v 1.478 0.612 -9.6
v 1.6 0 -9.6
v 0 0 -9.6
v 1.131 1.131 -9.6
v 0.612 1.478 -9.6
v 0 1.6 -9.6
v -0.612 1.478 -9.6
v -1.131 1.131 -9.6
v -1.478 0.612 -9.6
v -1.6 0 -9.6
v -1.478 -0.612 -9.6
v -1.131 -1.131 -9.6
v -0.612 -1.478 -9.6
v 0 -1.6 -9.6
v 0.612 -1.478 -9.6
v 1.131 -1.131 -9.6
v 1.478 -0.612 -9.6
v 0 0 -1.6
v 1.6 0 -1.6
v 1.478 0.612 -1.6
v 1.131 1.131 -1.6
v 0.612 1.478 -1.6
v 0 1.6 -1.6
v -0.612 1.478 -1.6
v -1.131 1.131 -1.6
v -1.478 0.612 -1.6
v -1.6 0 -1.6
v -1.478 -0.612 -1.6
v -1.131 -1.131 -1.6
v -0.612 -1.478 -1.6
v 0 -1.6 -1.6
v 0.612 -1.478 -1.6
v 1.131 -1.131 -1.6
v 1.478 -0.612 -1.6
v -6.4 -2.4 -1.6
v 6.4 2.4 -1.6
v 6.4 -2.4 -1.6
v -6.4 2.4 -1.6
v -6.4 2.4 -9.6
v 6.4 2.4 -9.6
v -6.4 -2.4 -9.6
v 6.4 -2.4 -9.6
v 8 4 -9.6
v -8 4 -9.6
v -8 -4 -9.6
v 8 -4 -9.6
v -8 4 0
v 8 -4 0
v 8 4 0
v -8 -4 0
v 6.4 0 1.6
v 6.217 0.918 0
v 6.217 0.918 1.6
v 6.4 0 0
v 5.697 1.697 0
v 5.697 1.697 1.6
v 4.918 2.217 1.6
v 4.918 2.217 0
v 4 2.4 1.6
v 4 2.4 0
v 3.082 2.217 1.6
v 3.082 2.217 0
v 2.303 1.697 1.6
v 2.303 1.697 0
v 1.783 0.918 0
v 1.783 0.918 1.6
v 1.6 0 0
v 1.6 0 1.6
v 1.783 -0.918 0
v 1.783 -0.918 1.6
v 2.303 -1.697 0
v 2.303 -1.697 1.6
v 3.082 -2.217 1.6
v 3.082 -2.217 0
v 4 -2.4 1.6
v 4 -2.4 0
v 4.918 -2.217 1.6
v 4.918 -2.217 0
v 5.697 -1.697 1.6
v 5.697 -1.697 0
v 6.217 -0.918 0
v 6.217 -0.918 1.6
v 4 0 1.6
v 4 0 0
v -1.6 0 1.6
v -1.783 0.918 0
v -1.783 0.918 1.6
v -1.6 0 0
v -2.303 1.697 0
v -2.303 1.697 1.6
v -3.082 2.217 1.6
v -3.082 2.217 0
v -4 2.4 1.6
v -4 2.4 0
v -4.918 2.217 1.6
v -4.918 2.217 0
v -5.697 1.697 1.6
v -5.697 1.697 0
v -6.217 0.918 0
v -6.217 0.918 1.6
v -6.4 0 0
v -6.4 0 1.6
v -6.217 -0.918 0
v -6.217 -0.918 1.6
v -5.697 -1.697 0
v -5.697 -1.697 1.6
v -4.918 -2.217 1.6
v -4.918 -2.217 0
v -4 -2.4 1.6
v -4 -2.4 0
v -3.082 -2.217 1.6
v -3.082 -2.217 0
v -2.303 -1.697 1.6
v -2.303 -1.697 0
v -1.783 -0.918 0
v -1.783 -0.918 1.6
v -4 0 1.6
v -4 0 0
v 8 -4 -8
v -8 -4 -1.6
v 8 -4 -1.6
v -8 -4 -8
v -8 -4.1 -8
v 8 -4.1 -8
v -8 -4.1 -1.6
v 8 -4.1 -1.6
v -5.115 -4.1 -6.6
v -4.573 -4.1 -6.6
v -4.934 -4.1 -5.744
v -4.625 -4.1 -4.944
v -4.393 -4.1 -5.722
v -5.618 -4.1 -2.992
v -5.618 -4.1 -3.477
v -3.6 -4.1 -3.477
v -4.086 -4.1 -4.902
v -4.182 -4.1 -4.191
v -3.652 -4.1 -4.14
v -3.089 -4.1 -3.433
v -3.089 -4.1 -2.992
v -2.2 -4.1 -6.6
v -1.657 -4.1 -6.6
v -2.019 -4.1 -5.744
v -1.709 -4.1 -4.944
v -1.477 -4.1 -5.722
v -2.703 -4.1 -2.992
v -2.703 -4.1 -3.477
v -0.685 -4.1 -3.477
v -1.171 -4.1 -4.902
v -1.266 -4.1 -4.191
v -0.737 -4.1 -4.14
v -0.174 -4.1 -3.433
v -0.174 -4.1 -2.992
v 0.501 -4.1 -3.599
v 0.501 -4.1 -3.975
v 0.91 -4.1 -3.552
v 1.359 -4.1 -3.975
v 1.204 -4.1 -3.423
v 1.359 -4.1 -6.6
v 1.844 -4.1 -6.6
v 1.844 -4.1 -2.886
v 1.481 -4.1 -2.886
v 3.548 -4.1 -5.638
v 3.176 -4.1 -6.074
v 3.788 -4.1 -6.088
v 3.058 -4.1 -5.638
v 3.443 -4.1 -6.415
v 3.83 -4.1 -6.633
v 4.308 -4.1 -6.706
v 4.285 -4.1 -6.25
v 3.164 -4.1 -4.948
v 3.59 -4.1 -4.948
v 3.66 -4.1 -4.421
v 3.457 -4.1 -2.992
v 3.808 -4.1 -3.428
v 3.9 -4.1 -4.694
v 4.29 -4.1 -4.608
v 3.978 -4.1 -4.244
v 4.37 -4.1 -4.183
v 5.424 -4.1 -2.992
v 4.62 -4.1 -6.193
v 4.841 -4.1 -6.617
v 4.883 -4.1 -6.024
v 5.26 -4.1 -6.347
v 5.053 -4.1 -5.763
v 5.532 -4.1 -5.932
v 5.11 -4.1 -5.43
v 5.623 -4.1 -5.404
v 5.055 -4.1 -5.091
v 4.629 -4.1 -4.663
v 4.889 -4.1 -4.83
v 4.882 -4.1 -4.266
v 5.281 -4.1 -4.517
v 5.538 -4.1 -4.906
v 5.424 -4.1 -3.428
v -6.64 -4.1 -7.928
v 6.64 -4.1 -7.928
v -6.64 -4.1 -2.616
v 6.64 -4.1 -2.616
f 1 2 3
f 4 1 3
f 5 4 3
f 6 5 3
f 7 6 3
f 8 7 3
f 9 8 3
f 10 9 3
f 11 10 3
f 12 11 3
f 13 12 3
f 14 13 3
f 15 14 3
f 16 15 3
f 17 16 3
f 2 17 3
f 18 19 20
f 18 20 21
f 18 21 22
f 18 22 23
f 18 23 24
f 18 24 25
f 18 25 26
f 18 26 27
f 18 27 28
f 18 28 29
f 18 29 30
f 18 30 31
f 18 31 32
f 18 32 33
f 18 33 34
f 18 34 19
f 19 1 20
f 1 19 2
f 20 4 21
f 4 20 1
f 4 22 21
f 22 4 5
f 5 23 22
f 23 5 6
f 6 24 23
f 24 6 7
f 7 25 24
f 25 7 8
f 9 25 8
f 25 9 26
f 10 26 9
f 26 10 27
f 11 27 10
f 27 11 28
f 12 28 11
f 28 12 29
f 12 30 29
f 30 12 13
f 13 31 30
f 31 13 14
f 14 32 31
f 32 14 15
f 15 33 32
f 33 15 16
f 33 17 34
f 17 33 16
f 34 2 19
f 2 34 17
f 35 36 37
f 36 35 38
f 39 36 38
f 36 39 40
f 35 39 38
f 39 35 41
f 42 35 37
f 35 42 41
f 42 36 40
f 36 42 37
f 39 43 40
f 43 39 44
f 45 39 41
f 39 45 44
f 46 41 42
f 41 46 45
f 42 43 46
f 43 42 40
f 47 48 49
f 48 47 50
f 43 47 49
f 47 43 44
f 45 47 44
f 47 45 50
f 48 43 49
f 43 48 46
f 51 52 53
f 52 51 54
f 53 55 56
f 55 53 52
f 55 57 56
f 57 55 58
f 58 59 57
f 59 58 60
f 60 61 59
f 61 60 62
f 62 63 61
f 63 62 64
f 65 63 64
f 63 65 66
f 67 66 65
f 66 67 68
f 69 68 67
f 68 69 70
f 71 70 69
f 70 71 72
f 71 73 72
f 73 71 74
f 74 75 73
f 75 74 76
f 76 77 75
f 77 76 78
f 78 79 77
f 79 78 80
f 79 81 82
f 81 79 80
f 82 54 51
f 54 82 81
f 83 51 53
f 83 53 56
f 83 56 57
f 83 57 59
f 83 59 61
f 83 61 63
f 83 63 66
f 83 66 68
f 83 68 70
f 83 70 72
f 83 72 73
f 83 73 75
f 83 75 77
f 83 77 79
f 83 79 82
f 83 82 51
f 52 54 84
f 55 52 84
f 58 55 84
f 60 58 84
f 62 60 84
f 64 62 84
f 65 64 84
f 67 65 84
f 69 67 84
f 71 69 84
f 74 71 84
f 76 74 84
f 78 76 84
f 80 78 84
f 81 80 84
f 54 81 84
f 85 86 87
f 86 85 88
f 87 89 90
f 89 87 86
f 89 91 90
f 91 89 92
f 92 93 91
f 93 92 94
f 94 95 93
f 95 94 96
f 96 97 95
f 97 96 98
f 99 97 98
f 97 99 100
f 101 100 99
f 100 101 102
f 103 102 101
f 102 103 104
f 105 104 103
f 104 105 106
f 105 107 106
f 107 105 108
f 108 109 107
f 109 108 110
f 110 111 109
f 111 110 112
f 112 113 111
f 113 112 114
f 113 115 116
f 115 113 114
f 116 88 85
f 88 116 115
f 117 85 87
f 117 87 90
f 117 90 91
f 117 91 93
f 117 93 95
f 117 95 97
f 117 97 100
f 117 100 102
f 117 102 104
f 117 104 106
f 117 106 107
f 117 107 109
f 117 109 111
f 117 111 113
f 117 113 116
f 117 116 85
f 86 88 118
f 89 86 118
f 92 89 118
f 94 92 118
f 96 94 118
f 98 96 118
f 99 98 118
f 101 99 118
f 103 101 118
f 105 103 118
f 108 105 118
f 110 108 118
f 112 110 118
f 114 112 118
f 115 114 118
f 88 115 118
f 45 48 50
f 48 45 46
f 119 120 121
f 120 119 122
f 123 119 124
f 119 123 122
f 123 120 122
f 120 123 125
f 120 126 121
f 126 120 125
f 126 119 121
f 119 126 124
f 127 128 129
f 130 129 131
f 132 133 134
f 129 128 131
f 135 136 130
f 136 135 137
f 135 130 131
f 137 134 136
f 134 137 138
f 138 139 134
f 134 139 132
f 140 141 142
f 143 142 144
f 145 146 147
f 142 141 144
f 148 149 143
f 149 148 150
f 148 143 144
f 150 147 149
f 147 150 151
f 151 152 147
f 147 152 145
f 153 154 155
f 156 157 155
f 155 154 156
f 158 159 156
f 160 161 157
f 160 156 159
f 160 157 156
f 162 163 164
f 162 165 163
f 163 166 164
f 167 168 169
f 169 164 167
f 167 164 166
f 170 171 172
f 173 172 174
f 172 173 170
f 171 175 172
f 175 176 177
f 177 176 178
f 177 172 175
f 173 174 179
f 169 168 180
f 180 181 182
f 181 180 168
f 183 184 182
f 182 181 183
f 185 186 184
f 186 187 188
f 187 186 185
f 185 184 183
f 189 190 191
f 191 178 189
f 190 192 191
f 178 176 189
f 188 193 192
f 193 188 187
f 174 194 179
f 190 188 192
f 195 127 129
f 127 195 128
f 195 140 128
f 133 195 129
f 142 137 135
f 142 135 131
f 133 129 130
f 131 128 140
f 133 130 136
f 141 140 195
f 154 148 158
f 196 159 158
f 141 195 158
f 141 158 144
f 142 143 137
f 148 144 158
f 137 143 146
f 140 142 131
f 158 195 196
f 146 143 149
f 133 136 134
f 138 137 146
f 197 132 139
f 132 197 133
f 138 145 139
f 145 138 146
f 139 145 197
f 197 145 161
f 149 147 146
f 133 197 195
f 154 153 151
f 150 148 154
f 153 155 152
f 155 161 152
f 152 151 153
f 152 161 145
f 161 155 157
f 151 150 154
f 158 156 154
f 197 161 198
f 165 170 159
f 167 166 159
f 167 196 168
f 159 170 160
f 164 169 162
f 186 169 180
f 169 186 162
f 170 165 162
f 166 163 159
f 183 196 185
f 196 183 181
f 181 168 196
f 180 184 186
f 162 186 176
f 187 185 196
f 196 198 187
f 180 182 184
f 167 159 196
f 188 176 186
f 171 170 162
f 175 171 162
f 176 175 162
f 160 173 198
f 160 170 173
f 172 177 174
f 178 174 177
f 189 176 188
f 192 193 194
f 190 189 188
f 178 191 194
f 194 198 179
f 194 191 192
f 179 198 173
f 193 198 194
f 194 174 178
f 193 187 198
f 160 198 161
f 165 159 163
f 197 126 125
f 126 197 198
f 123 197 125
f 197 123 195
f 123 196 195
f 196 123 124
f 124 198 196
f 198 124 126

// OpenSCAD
// file: ../p/4-4edge.scad
use <../lib.scad>
function ldraw_lib__4_4edge() = [
// 0 Circle 1.0
// 0 Name: 4-4edge.dat
// 0 Author: James Jessiman
// 0 !LDRAW_ORG Primitive UPDATE 2017-01
// 0 !LICENSE Licensed under CC BY 2.0 and CC BY 4.0 : see CAreadme.txt
// 
// 0 BFC CERTIFY CCW
  [0,"BFC","CERTIFY"],
  [0,"BFC","CCW"],
// 
// 0 !HISTORY 1998-12-15 [PTadmin] Official Update 1998-10
// 0 !HISTORY 2005-12-28 [PTadmin] Official Update 2005-01
// 0 !HISTORY 2007-06-24 [PTadmin] Header formatted for Contributor Agreement
// 0 !HISTORY 2008-07-01 [PTadmin] Official Update 2008-01
// 0 !HISTORY 2017-01-15 [Steffen] BFCed
// 0 !HISTORY 2017-12-30 [PTadmin] Official Update 2017-01
// 
// 
// 2 24 1 0 0 0.9239 0 0.3827
  [2,24,1,0,0,0.9239,0,0.3827],
// 2 24 0.9239 0 0.3827 0.7071 0 0.7071
  [2,24,0.9239,0,0.3827,0.7071,0,0.7071],
// 2 24 0.7071 0 0.7071 0.3827 0 0.9239
  [2,24,0.7071,0,0.7071,0.3827,0,0.9239],
// 2 24 0.3827 0 0.9239 0 0 1
  [2,24,0.3827,0,0.9239,0,0,1],
// 2 24 0 0 1 -0.3827 0 0.9239
  [2,24,0,0,1,-0.3827,0,0.9239],
// 2 24 -0.3827 0 0.9239 -0.7071 0 0.7071
  [2,24,-0.3827,0,0.9239,-0.7071,0,0.7071],
// 2 24 -0.7071 0 0.7071 -0.9239 0 0.3827
  [2,24,-0.7071,0,0.7071,-0.9239,0,0.3827],
// 2 24 -0.9239 0 0.3827 -1 0 -0
  [2,24,-0.9239,0,0.3827,-1,0,-0],
// 2 24 -1 0 -0 -0.9239 0 -0.3827
  [2,24,-1,0,-0,-0.9239,0,-0.3827],
// 2 24 -0.9239 0 -0.3827 -0.7071 0 -0.7071
  [2,24,-0.9239,0,-0.3827,-0.7071,0,-0.7071],
// 2 24 -0.7071 0 -0.7071 -0.3827 0 -0.9239
  [2,24,-0.7071,0,-0.7071,-0.3827,0,-0.9239],
// 2 24 -0.3827 0 -0.9239 0 0 -1
  [2,24,-0.3827,0,-0.9239,0,0,-1],
// 2 24 0 0 -1 0.3827 0 -0.9239
  [2,24,0,0,-1,0.3827,0,-0.9239],
// 2 24 0.3827 0 -0.9239 0.7071 0 -0.7071
  [2,24,0.3827,0,-0.9239,0.7071,0,-0.7071],
// 2 24 0.7071 0 -0.7071 0.9239 0 -0.3827
  [2,24,0.7071,0,-0.7071,0.9239,0,-0.3827],
// 2 24 0.9239 0 -0.3827 1 0 0
  [2,24,0.9239,0,-0.3827,1,0,0],
];
module ldraw_lib__4_4edge(step=0, col=false, unit=2/5, alt=false, line=0.2, solid=!$preview)
    makepoly(ldraw_lib__4_4edge(), step=step, col=col, unit=unit, alt=alt, line=line, solid=solid);
ldraw_lib__4_4edge(line=0.2);
// file: ../p/4-4disc.scad
use <../lib.scad>
function ldraw_lib__4_4disc() = [
// 0 Disc 1.0
// 0 Name: 4-4disc.dat
// 0 Author: James Jessiman
// 0 !LDRAW_ORG Primitive UPDATE 2002-02
// 0 !LICENSE Licensed under CC BY 2.0 and CC BY 4.0 : see CAreadme.txt
// 
// 0 BFC CERTIFY CCW
  [0,"BFC","CERTIFY"],
  [0,"BFC","CCW"],
// 
// 0 !HISTORY 1998-12-15 [PTadmin] Official Update 1998-10
// 0 !HISTORY 2002-03-23 [sbliss] Added BFC statement
// 0 !HISTORY 2002-04-25 [PTadmin] Official Update 2002-02
// 0 !HISTORY 2007-06-24 [PTadmin] Header formatted for Contributor Agreement
// 0 !HISTORY 2008-07-01 [PTadmin] Official Update 2008-01
// 
// 
// 3 16 0 0 0 1 0 0 0.9239 0 0.3827
  [3,16,0,0,0,1,0,0,0.9239,0,0.3827],
// 3 16 0 0 0 0.9239 0 0.3827 0.7071 0 0.7071
  [3,16,0,0,0,0.9239,0,0.3827,0.7071,0,0.7071],
// 3 16 0 0 0 0.7071 0 0.7071 0.3827 0 0.9239
  [3,16,0,0,0,0.7071,0,0.7071,0.3827,0,0.9239],
// 3 16 0 0 0 0.3827 0 0.9239 0 0 1
  [3,16,0,0,0,0.3827,0,0.9239,0,0,1],
// 3 16 0 0 0 0 0 1 -0.3827 0 0.9239
  [3,16,0,0,0,0,0,1,-0.3827,0,0.9239],
// 3 16 0 0 0 -0.3827 0 0.9239 -0.7071 0 0.7071
  [3,16,0,0,0,-0.3827,0,0.9239,-0.7071,0,0.7071],
// 3 16 0 0 0 -0.7071 0 0.7071 -0.9239 0 0.3827
  [3,16,0,0,0,-0.7071,0,0.7071,-0.9239,0,0.3827],
// 3 16 0 0 0 -0.9239 0 0.3827 -1 0 -0
  [3,16,0,0,0,-0.9239,0,0.3827,-1,0,-0],
// 3 16 0 0 0 -1 0 -0 -0.9239 0 -0.3827
  [3,16,0,0,0,-1,0,-0,-0.9239,0,-0.3827],
// 3 16 0 0 0 -0.9239 0 -0.3827 -0.7071 0 -0.7071
  [3,16,0,0,0,-0.9239,0,-0.3827,-0.7071,0,-0.7071],
// 3 16 0 0 0 -0.7071 0 -0.7071 -0.3827 0 -0.9239
  [3,16,0,0,0,-0.7071,0,-0.7071,-0.3827,0,-0.9239],
// 3 16 0 0 0 -0.3827 0 -0.9239 0 0 -1
  [3,16,0,0,0,-0.3827,0,-0.9239,0,0,-1],
// 3 16 0 0 0 0 0 -1 0.3827 0 -0.9239
  [3,16,0,0,0,0,0,-1,0.3827,0,-0.9239],
// 3 16 0 0 0 0.3827 0 -0.9239 0.7071 0 -0.7071
  [3,16,0,0,0,0.3827,0,-0.9239,0.7071,0,-0.7071],
// 3 16 0 0 0 0.7071 0 -0.7071 0.9239 0 -0.3827
  [3,16,0,0,0,0.7071,0,-0.7071,0.9239,0,-0.3827],
// 3 16 0 0 0 0.9239 0 -0.3827 1 0 0
  [3,16,0,0,0,0.9239,0,-0.3827,1,0,0],
// 0
];
module ldraw_lib__4_4disc(step=0, col=false, unit=2/5, alt=false, line=0.2, solid=!$preview)
    makepoly(ldraw_lib__4_4disc(), step=step, col=col, unit=unit, alt=alt, line=line, solid=solid);
ldraw_lib__4_4disc(line=0.2);
// file: ../p/4-4cyli.scad
use <../lib.scad>
$fa=1; $fs=0.2;
function ldraw_lib__4_4cyli(realsolid=false) = [
// 0 Cylinder 1.0
// 0 Name: 4-4cyli.dat
// 0 Author: James Jessiman
// 0 !LDRAW_ORG Primitive UPDATE 2005-01
// 0 !LICENSE Licensed under CC BY 2.0 and CC BY 4.0 : see CAreadme.txt
// 
// 0 BFC CERTIFY CCW
  [0,"BFC","CERTIFY"],
  [0,"BFC","CCW"],
// 
// 0 !HISTORY 1998-12-15 [PTadmin] Official Update 1998-10
// 0 !HISTORY 2002-03-23 [sbliss] Added BFC statement; merged headers from files in distributions LDraw 0.27 and Complete.
// 0 !HISTORY 2002-04-25 [PTadmin] Official Update 2002-02
// 0 !HISTORY 2004-12-14 [guyvivan] BFC CCW
// 0 !HISTORY 2005-12-28 [PTadmin] Official Update 2005-01
// 0 !HISTORY 2007-06-24 [PTadmin] Header formatted for Contributor Agreement
// 0 !HISTORY 2008-07-01 [PTadmin] Official Update 2008-01
// 
// 
// 4 16 1 1 0 0.9239 1 0.3827 0.9239 0 0.3827 1 0 0
  [4,16,1,1,0,0.9239,1,0.3827,0.9239,0,0.3827,1,0,0],
// 5 24 1 0 0 1 1 0 0.9239 0 0.3827 0.9239 0 -0.3827
  [5,24,1,0,0,1,1,0,0.9239,0,0.3827,0.9239,0,-0.3827],
// 4 16 0.9239 1 0.3827 0.7071 1 0.7071 0.7071 0 0.7071 0.9239 0 0.3827
  [4,16,0.9239,1,0.3827,0.7071,1,0.7071,0.7071,0,0.7071,0.9239,0,0.3827],
// 5 24 0.9239 0 0.3827 0.9239 1 0.3827 0.7071 0 0.7071 1 0 0
  [5,24,0.9239,0,0.3827,0.9239,1,0.3827,0.7071,0,0.7071,1,0,0],
// 4 16 0.7071 1 0.7071 0.3827 1 0.9239 0.3827 0 0.9239 0.7071 0 0.7071
  [4,16,0.7071,1,0.7071,0.3827,1,0.9239,0.3827,0,0.9239,0.7071,0,0.7071],
// 5 24 0.7071 0 0.7071 0.7071 1 0.7071 0.3827 0 0.9239 0.9239 0 0.3827
  [5,24,0.7071,0,0.7071,0.7071,1,0.7071,0.3827,0,0.9239,0.9239,0,0.3827],
// 4 16 0.3827 1 0.9239 0 1 1 0 0 1 0.3827 0 0.9239
  [4,16,0.3827,1,0.9239,0,1,1,0,0,1,0.3827,0,0.9239],
// 5 24 0.3827 0 0.9239 0.3827 1 0.9239 0 0 1 0.7071 0 0.7071
  [5,24,0.3827,0,0.9239,0.3827,1,0.9239,0,0,1,0.7071,0,0.7071],
// 4 16 0 1 1 -0.3827 1 0.9239 -0.3827 0 0.9239 0 0 1
  [4,16,0,1,1,-0.3827,1,0.9239,-0.3827,0,0.9239,0,0,1],
// 5 24 0 0 1 0 1 1 -0.3827 0 0.9239 0.3827 0 0.9239
  [5,24,0,0,1,0,1,1,-0.3827,0,0.9239,0.3827,0,0.9239],
// 4 16 -0.3827 1 0.9239 -0.7071 1 0.7071 -0.7071 0 0.7071 -0.3827 0 0.9239
  [4,16,-0.3827,1,0.9239,-0.7071,1,0.7071,-0.7071,0,0.7071,-0.3827,0,0.9239],
// 5 24 -0.3827 0 0.9239 -0.3827 1 0.9239 -0.7071 0 0.7071 0 0 1
  [5,24,-0.3827,0,0.9239,-0.3827,1,0.9239,-0.7071,0,0.7071,0,0,1],
// 4 16 -0.7071 1 0.7071 -0.9239 1 0.3827 -0.9239 0 0.3827 -0.7071 0 0.7071
  [4,16,-0.7071,1,0.7071,-0.9239,1,0.3827,-0.9239,0,0.3827,-0.7071,0,0.7071],
// 5 24 -0.7071 0 0.7071 -0.7071 1 0.7071 -0.9239 0 0.3827 -0.3827 0 0.9239
  [5,24,-0.7071,0,0.7071,-0.7071,1,0.7071,-0.9239,0,0.3827,-0.3827,0,0.9239],
// 4 16 -0.9239 1 0.3827 -1 1 0 -1 0 0 -0.9239 0 0.3827
  [4,16,-0.9239,1,0.3827,-1,1,0,-1,0,0,-0.9239,0,0.3827],
// 5 24 -0.9239 0 0.3827 -0.9239 1 0.3827 -1 0 0 -0.7071 0 0.7071
  [5,24,-0.9239,0,0.3827,-0.9239,1,0.3827,-1,0,0,-0.7071,0,0.7071],
// 4 16 -1 1 0 -0.9239 1 -0.3827 -0.9239 0 -0.3827 -1 0 0
  [4,16,-1,1,0,-0.9239,1,-0.3827,-0.9239,0,-0.3827,-1,0,0],
// 5 24 -1 0 0 -1 1 0 -0.9239 0 -0.3827 -0.9239 0 0.3827
  [5,24,-1,0,0,-1,1,0,-0.9239,0,-0.3827,-0.9239,0,0.3827],
// 4 16 -0.9239 1 -0.3827 -0.7071 1 -0.7071 -0.7071 0 -0.7071 -0.9239 0 -0.3827
  [4,16,-0.9239,1,-0.3827,-0.7071,1,-0.7071,-0.7071,0,-0.7071,-0.9239,0,-0.3827],
// 5 24 -0.9239 0 -0.3827 -0.9239 1 -0.3827 -0.7071 0 -0.7071 -1 0 0
  [5,24,-0.9239,0,-0.3827,-0.9239,1,-0.3827,-0.7071,0,-0.7071,-1,0,0],
// 4 16 -0.7071 1 -0.7071 -0.3827 1 -0.9239 -0.3827 0 -0.9239 -0.7071 0 -0.7071
  [4,16,-0.7071,1,-0.7071,-0.3827,1,-0.9239,-0.3827,0,-0.9239,-0.7071,0,-0.7071],
// 5 24 -0.7071 0 -0.7071 -0.7071 1 -0.7071 -0.3827 0 -0.9239 -0.9239 0 -0.3827
  [5,24,-0.7071,0,-0.7071,-0.7071,1,-0.7071,-0.3827,0,-0.9239,-0.9239,0,-0.3827],
// 4 16 -0.3827 1 -0.9239 0 1 -1 0 0 -1 -0.3827 0 -0.9239
  [4,16,-0.3827,1,-0.9239,0,1,-1,0,0,-1,-0.3827,0,-0.9239],
// 5 24 -0.3827 0 -0.9239 -0.3827 1 -0.9239 0 0 -1 -0.7071 0 -0.7071
  [5,24,-0.3827,0,-0.9239,-0.3827,1,-0.9239,0,0,-1,-0.7071,0,-0.7071],
// 4 16 0 1 -1 0.3827 1 -0.9239 0.3827 0 -0.9239 0 0 -1
  [4,16,0,1,-1,0.3827,1,-0.9239,0.3827,0,-0.9239,0,0,-1],
// 5 24 0 0 -1 0 1 -1 0.3827 0 -0.9239 -0.3827 0 -0.9239
  [5,24,0,0,-1,0,1,-1,0.3827,0,-0.9239,-0.3827,0,-0.9239],
// 4 16 0.3827 1 -0.9239 0.7071 1 -0.7071 0.7071 0 -0.7071 0.3827 0 -0.9239
  [4,16,0.3827,1,-0.9239,0.7071,1,-0.7071,0.7071,0,-0.7071,0.3827,0,-0.9239],
// 5 24 0.3827 0 -0.9239 0.3827 1 -0.9239 0.7071 0 -0.7071 0 0 -1
  [5,24,0.3827,0,-0.9239,0.3827,1,-0.9239,0.7071,0,-0.7071,0,0,-1],
// 4 16 0.7071 1 -0.7071 0.9239 1 -0.3827 0.9239 0 -0.3827 0.7071 0 -0.7071
  [4,16,0.7071,1,-0.7071,0.9239,1,-0.3827,0.9239,0,-0.3827,0.7071,0,-0.7071],
// 5 24 0.7071 0 -0.7071 0.7071 1 -0.7071 0.9239 0 -0.3827 0.3827 0 -0.9239
  [5,24,0.7071,0,-0.7071,0.7071,1,-0.7071,0.9239,0,-0.3827,0.3827,0,-0.9239],
// 4 16 0.9239 1 -0.3827 1 1 0 1 0 0 0.9239 0 -0.3827
  [4,16,0.9239,1,-0.3827,1,1,0,1,0,0,0.9239,0,-0.3827],
// 5 24 0.9239 0 -0.3827 0.9239 1 -0.3827 1 0 0 0.7071 0 -0.7071
  [5,24,0.9239,0,-0.3827,0.9239,1,-0.3827,1,0,0,0.7071,0,-0.7071],
// 0
];
module ldraw_lib__4_4cyli(step=0, col=false, unit=2/5, alt=false, line=0.2, solid=!$preview)
    makepoly(ldraw_lib__4_4cyli(solid), step=step, col=col, unit=unit, alt=alt, line=line, solid=solid);
ldraw_lib__4_4cyli(line=0.2);
// file: ../p/stud3.scad
use <../lib.scad>
use <4-4cyli.scad>
use <4-4disc.scad>
use <4-4edge.scad>
function ldraw_lib__stud3() = [
// 0 Stud Tube Solid
// 0 Name: stud3.dat
// 0 Author: James Jessiman
// 0 !LDRAW_ORG Primitive UPDATE 2012-01
// 0 !LICENSE Licensed under CC BY 4.0 : see CAreadme.txt
// 
// 0 BFC CERTIFY CCW
  [0,"BFC","CERTIFY"],
  [0,"BFC","CCW"],
// 
// 0 !HISTORY 2002-04-04 [sbliss] Modified for BFC compliance
// 0 !HISTORY 2002-04-25 [PTadmin] Official Update 2002-02
// 0 !HISTORY 2007-06-24 [PTadmin] Header formatted for Contributor Agreement
// 0 !HISTORY 2008-07-01 [PTadmin] Official Update 2008-01
// 0 !HISTORY 2012-02-16 [Philo] Changed to CCW
// 0 !HISTORY 2012-03-30 [PTadmin] Official Update 2012-01
// 
// 
// 1 16 0 -4 0 4 0 0 0 1 0 0 0 4 4-4edge.dat
  [1,16,0,-4,0,4,0,0,0,1,0,0,0,4, ldraw_lib__4_4edge()],
// 1 16 0 0 0 4 0 0 0 1 0 0 0 4 4-4edge.dat
  [1,16,0,0,0,4,0,0,0,1,0,0,0,4, ldraw_lib__4_4edge()],
// 1 16 0 -4 0 4 0 0 0 1 0 0 0 4 4-4disc.dat
  [1,16,0,-4,0,4,0,0,0,1,0,0,0,4, ldraw_lib__4_4disc()],
  [-1,16,0,0,0,4,0,0,0,-1,0,0,0,4, ldraw_lib__4_4disc()],
// 1 16 0 -4 0 4 0 0 0 4 0 0 0 4 4-4cyli.dat
  [1,16,0,-4,0,4,0,0,0,4,0,0,0,4, ldraw_lib__4_4cyli()],
];
module ldraw_lib__stud3(step=0, col=false, unit=2/5, alt=false, line=0.2, solid=!$preview)
    makepoly(ldraw_lib__stud3(), step=step, col=col, unit=unit, alt=alt, line=line, solid=solid);
ldraw_lib__stud3(line=0.2);
// file: ../p/stud.scad
use <../lib.scad>
use <4-4cyli.scad>
use <4-4disc.scad>
use <4-4edge.scad>
function ldraw_lib__stud() = [
// 0 Stud
// 0 Name: stud.dat
// 0 Author: James Jessiman
// 0 !LDRAW_ORG Primitive UPDATE 2012-01
// 0 !LICENSE Licensed under CC BY 4.0 : see CAreadme.txt
// 
// 0 BFC CERTIFY CCW
  [0,"BFC","CERTIFY"],
  [0,"BFC","CCW"],
// 
// 0 !HISTORY 2002-04-04 [sbliss] Modified for BFC compliance
// 0 !HISTORY 2002-04-25 [PTadmin] Official Update 2002-02
// 0 !HISTORY 2007-06-24 [PTadmin] Header formatted for Contributor Agreement
// 0 !HISTORY 2008-07-01 [PTadmin] Official Update 2008-01
// 0 !HISTORY 2012-02-16 [Philo] Changed to CCW
// 0 !HISTORY 2012-03-30 [PTadmin] Official Update 2012-01
// 
// 
// 1 16 0 0 0 6 0 0 0 1 0 0 0 6 4-4edge.dat
  [1,16,0,0,0,6,0,0,0,1,0,0,0,6, ldraw_lib__4_4edge()],
// 1 16 0 -4 0 6 0 0 0 1 0 0 0 6 4-4edge.dat
  [1,16,0,-4,0,6,0,0,0,1,0,0,0,6, ldraw_lib__4_4edge()],
// 1 16 0 0 0 6 0 0 0 -4 0 0 0 6 4-4cyli.dat
  [1,16,0,0,0,6,0,0,0,-4,0,0,0,6, ldraw_lib__4_4cyli()],
// 1 16 0 -4 0 6 0 0 0 1 0 0 0 6 4-4disc.dat
  [1,16,0,-4,0,6,0,0,0,1,0,0,0,6, ldraw_lib__4_4disc()],
  [-1,16,0,0,0,6,0,0,0,-1,0,0,0,6, ldraw_lib__4_4disc()],
];
module ldraw_lib__stud(step=0, col=false, unit=2/5, alt=false, line=0.2, solid=!$preview)
    makepoly(ldraw_lib__stud(), step=step, col=col, unit=unit, alt=alt, line=line, solid=solid);
ldraw_lib__stud(line=0.2);
// file: ../p/box5.scad
use <../lib.scad>
function ldraw_lib__box5() = [
// 0 Box with 5 Faces and All Edges
// 0 Name: box5.dat
// 0 Author: James Jessiman
// 0 !LDRAW_ORG Primitive UPDATE 2012-01
// 0 !LICENSE Licensed under CC BY 2.0 and CC BY 4.0 : see CAreadme.txt
// 
// 0 BFC CERTIFY CCW
  [0,"BFC","CERTIFY"],
  [0,"BFC","CCW"],
// 
// 0 !HISTORY 2002-04-03 [sbliss] Modified for BFC compliance
// 0 !HISTORY 2002-04-25 [PTadmin] Official Update 2002-02
// 0 !HISTORY 2007-06-24 [PTadmin] Header formatted for Contributor Agreement
// 0 !HISTORY 2008-07-01 [PTadmin] Official Update 2008-01
// 0 !HISTORY 2012-02-16 [Philo] Changed to CCW
// 0 !HISTORY 2012-03-30 [PTadmin] Official Update 2012-01
// 
// 
// 2 24 1 1 1 -1 1 1
  [2,24,1,1,1,-1,1,1],
// 2 24 -1 1 1 -1 1 -1
  [2,24,-1,1,1,-1,1,-1],
// 2 24 -1 1 -1 1 1 -1
  [2,24,-1,1,-1,1,1,-1],
// 2 24 1 1 -1 1 1 1
  [2,24,1,1,-1,1,1,1],
// 2 24 1 0 1 -1 0 1
  [2,24,1,0,1,-1,0,1],
// 2 24 -1 0 1 -1 0 -1
  [2,24,-1,0,1,-1,0,-1],
// 2 24 -1 0 -1 1 0 -1
  [2,24,-1,0,-1,1,0,-1],
// 2 24 1 0 -1 1 0 1
  [2,24,1,0,-1,1,0,1],
// 2 24 1 0 1 1 1 1
  [2,24,1,0,1,1,1,1],
// 2 24 -1 0 1 -1 1 1
  [2,24,-1,0,1,-1,1,1],
// 2 24 1 0 -1 1 1 -1
  [2,24,1,0,-1,1,1,-1],
// 2 24 -1 0 -1 -1 1 -1
  [2,24,-1,0,-1,-1,1,-1],
// 4 16 -1 1 1 1 1 1 1 1 -1 -1 1 -1
  [4,16,-1,1,1,1,1,1,1,1,-1,-1,1,-1],
// 4 16 -1 1 1 -1 0 1 1 0 1 1 1 1
  [4,16,-1,1,1,-1,0,1,1,0,1,1,1,1],
// 4 16 -1 1 -1 -1 0 -1 -1 0 1 -1 1 1
  [4,16,-1,1,-1,-1,0,-1,-1,0,1,-1,1,1],
// 4 16 1 1 -1 1 0 -1 -1 0 -1 -1 1 -1
  [4,16,1,1,-1,1,0,-1,-1,0,-1,-1,1,-1],
// 4 16 1 1 1 1 0 1 1 0 -1 1 1 -1
  [4,16,1,1,1,1,0,1,1,0,-1,1,1,-1],
];
makepoly(ldraw_lib__box5(), line=0.2);
// file: ../p/box4t.scad
use <../lib.scad>
function ldraw_lib__box4t() = [
// 0 Box with 4 Adjacent Faces and All Edges
// 0 Name: box4t.dat
// 0 Author: Tore Eriksson [Tore_Eriksson]
// 0 !LDRAW_ORG Primitive UPDATE 2003-02
// 0 !LICENSE Licensed under CC BY 2.0 and CC BY 4.0 : see CAreadme.txt
// 
// 0 BFC CERTIFY CCW
  [0,"BFC","CERTIFY"],
  [0,"BFC","CCW"],
// 
// 0 !HISTORY 1997-09-29 [PTadmin] Official Update 1997-15
// 0 !HISTORY 2002-08-31 [izanette] Modified with WINDZ for BFC compliance
// 0 !HISTORY 2003-08-01 [PTadmin] Official Update 2003-02
// 0 !HISTORY 2007-06-24 [PTadmin] Header formatted for Contributor Agreement
// 0 !HISTORY 2008-07-01 [PTadmin] Official Update 2008-01
// 
// 
// 2 24 1 1 1 -1 1 1
  [2,24,1,1,1,-1,1,1],
// 2 24 -1 1 1 -1 1 -1
  [2,24,-1,1,1,-1,1,-1],
// 2 24 -1 1 -1 1 1 -1
  [2,24,-1,1,-1,1,1,-1],
// 2 24 1 1 -1 1 1 1
  [2,24,1,1,-1,1,1,1],
// 2 24 1 0 1 -1 0 1
  [2,24,1,0,1,-1,0,1],
// 2 24 -1 0 1 -1 0 -1
  [2,24,-1,0,1,-1,0,-1],
// 2 24 -1 0 -1 1 0 -1
  [2,24,-1,0,-1,1,0,-1],
// 2 24 1 0 -1 1 0 1
  [2,24,1,0,-1,1,0,1],
// 2 24 1 0 1 1 1 1
  [2,24,1,0,1,1,1,1],
// 2 24 -1 0 1 -1 1 1
  [2,24,-1,0,1,-1,1,1],
// 2 24 1 0 -1 1 1 -1
  [2,24,1,0,-1,1,1,-1],
// 2 24 -1 0 -1 -1 1 -1
  [2,24,-1,0,-1,-1,1,-1],
// 4 16 1 1 1 1 1 -1 -1 1 -1 -1 1 1
  [4,16,1,1,1,1,1,-1,-1,1,-1,-1,1,1],
// 4 16 1 1 1 -1 1 1 -1 0 1 1 0 1
  [4,16,1,1,1,-1,1,1,-1,0,1,1,0,1],
// 4 16 -1 1 1 -1 1 -1 -1 0 -1 -1 0 1
  [4,16,-1,1,1,-1,1,-1,-1,0,-1,-1,0,1],
// 0 4 16 -1 1 -1 -1 0 -1 1 0 -1 1 1 -1
// 4 16 1 1 -1 1 1 1 1 0 1 1 0 -1
  [4,16,1,1,-1,1,1,1,1,0,1,1,0,-1],
// 0
];
makepoly(ldraw_lib__box4t(), line=0.2);
// file: s/3004s01.scad
use <../../lib.scad>
use <../../p/box4t.scad>
use <../../p/box5.scad>
use <../../p/stud.scad>
use <../../p/stud3.scad>
$fa=1; $fs=0.2;
function ldraw_lib__s__3004s01(realsolid=false) = [
// 0 ~Brick  1 x  2 without Front Face
// 0 Name: s\3004s01.dat
// 0 Author: James Jessiman
// 0 !LDRAW_ORG Subpart UPDATE 2003-03
// 0 !LICENSE Licensed under CC BY 2.0 and CC BY 4.0 : see CAreadme.txt
// 
// 0 BFC CERTIFY CCW
  [0,"BFC","CERTIFY"],
  [0,"BFC","CCW"],
// 
// 0 !HISTORY 2003-09-07 [jriley] Subfiling, BFC
// 0 !HISTORY 2003-12-19 [PTadmin] Official Update 2003-03
// 0 !HISTORY 2007-08-29 [PTadmin] Header formatted for Contributor Agreement
// 0 !HISTORY 2008-07-01 [PTadmin] Official Update 2008-01
// 
// 
// 1 16 0 4 0 1 0 0 0 -5 0 0 0 1 stud3.dat
  [1,16,0,4,0,1,0,0,0,-5,0,0,0,1, ldraw_lib__stud3(realsolid)],
// 0 BFC INVERTNEXT
  [0,"BFC","INVERTNEXT"],
// 1 16 0 24 0 16 0 0 0 -20 0 0 0 6 box5.dat
  [1,16,0,24,0,16,0,0,0,-20,0,0,0,6, ldraw_lib__box5(realsolid)],
// 4 16 20 24 10 16 24 6 -16 24 6 -20 24 10
  [4,16,20,24,10,16,24,6,-16,24,6,-20,24,10],
// 4 16 -20 24 10 -16 24 6 -16 24 -6 -20 24 -10
  [4,16,-20,24,10,-16,24,6,-16,24,-6,-20,24,-10],
// 4 16 -20 24 -10 -16 24 -6 16 24 -6 20 24 -10
  [4,16,-20,24,-10,-16,24,-6,16,24,-6,20,24,-10],
// 4 16 20 24 -10 16 24 -6 16 24 6 20 24 10
  [4,16,20,24,-10,16,24,-6,16,24,6,20,24,10],
// 1 16 0 24 0 20 0 0 0 -24 0 0 0 10 box4t.dat
  [1,16,0,24,0,20,0,0,0,-24,0,0,0,10, ldraw_lib__box4t(realsolid)],
// 1 16 10 0 0 1 0 0 0 1 0 0 0 1 stud.dat
  [1,16,10,0,0,1,0,0,0,1,0,0,0,1, ldraw_lib__stud(realsolid)],
// 1 16 -10 0 0 1 0 0 0 1 0 0 0 1 stud.dat
  [1,16,-10,0,0,1,0,0,0,1,0,0,0,1, ldraw_lib__stud(realsolid)],
// 0
];
module ldraw_lib__s__3004s01(step=0, col=false, unit=2/5, alt=false, line=0.2, solid=!$preview)
    makepoly(ldraw_lib__s__3004s01(solid), step=step, col=col, unit=unit, alt=alt, line=line, solid=solid);
ldraw_lib__s__3004s01(line=0.2);
// file: ../p/box5-12.scad
use <../lib.scad>
function ldraw_lib__box5_12() = [
// 0 Box with 5 Faces without Any Edges
// 0 Name: box5-12.dat
// 0 Author: Chris Dee [cwdee]
// 0 !LDRAW_ORG Primitive UPDATE 2009-02
// 0 !LICENSE Licensed under CC BY 2.0 and CC BY 4.0 : see CAreadme.txt
// 
// 0 BFC CERTIFY CCW
  [0,"BFC","CERTIFY"],
  [0,"BFC","CCW"],
// 
// 0 !HISTORY 2009-09-03 [PTadmin] Official Update 2009-02
// 
// 
// 4 16 1 1 1 1 1 -1 -1 1 -1 -1 1 1
  [4,16,1,1,1,1,1,-1,-1,1,-1,-1,1,1],
// 4 16 -1 0 1 1 0 1 1 1 1 -1 1 1
  [4,16,-1,0,1,1,0,1,1,1,1,-1,1,1],
// 4 16 -1 0 -1 -1 0 1 -1 1 1 -1 1 -1
  [4,16,-1,0,-1,-1,0,1,-1,1,1,-1,1,-1],
// 4 16 1 0 -1 -1 0 -1 -1 1 -1 1 1 -1
  [4,16,1,0,-1,-1,0,-1,-1,1,-1,1,1,-1],
// 4 16 1 0 1 1 0 -1 1 1 -1 1 1 1
  [4,16,1,0,1,1,0,-1,1,1,-1,1,1,1],
// 0
];
module ldraw_lib__box5_12(step=0, col=false, unit=2/5, alt=false, line=0.2, solid=!$preview)
    makepoly(ldraw_lib__box5_12(), step=step, col=col, unit=unit, alt=alt, line=line, solid=solid);
ldraw_lib__box5_12(line=0.2);
// file: 3004.scad
use <../lib.scad>
use <s/3004s01.scad>
function ldraw_lib__3004() = [
// 0 Brick  1 x  2
// 0 Name: 3004.dat
// 0 Author: James Jessiman
// 0 !LDRAW_ORG Part UPDATE 2022-05
// 0 !LICENSE Licensed under CC BY 2.0 and CC BY 4.0 : see CAreadme.txt
// 
// 0 BFC CERTIFY CCW
  [0,"BFC","CERTIFY"],
  [0,"BFC","CCW"],
// 
// 0 !HISTORY 2001-10-26 [PTadmin] Official Update 2001-01
// 0 !HISTORY 2002-05-07 {unknown} BFC Certification
// 0 !HISTORY 2002-06-11 [PTadmin] Official Update 2002-03
// 0 !HISTORY 2007-05-07 [PTadmin] Header formatted for Contributor Agreement
// 0 !HISTORY 2008-07-01 [PTadmin] Official Update 2008-01
// 0 !HISTORY 2022-08-04 [MagFors] Using subfile
// 0 !HISTORY 2022-09-15 [PTadmin] Official Update 2022-05
// 
// 
// 1 16 0 0 0 1 0 0 0 1 0 0 0 1 s\3004s01.dat
  [1,16,0,0,0,1,0,0,0,1,0,0,0,1, ldraw_lib__s__3004s01()],
// 4 16 -20 24 -10 20 24 -10 20 0 -10 -20 0 -10
  [4,16,-20,24,-10,20,24,-10,20,0,-10,-20,0,-10],
];
module ldraw_lib__3004(step=0, col=false, unit=2/5, alt=false, line=0.2, solid=!$preview)
    makepoly(ldraw_lib__3004(), step=step, col=col, unit=unit, alt=alt, line=line, solid=solid);
ldraw_lib__3004(line=0.2);
// file: 196925b.scad
use <../lib.scad>
use <../p/box5-12.scad>
use <s/196925s01.scad>
function ldraw_lib__196925b() = [
// 0 Sticker  0.8 x  2 with White "7715"
// 0 Name: 196925b.dat
// 0 Author: Takeshi Takahashi [RainbowDolphin]
// 0 !LDRAW_ORG Part UPDATE 2025-04
// 0 !LICENSE Licensed under CC BY 4.0 : see CAreadme.txt
// 
// 0 BFC CERTIFY CCW
  [0,"BFC","CERTIFY"],
  [0,"BFC","CCW"],
// 
// 0 !KEYWORDS 12V Trains, Bricklink 7715stk01, locomotive, Rebrickable 196925
// 0 !KEYWORDS Set 7715
// 
// 0 !HISTORY 2021-10-28 [RainbowDolphin] Created based on 196935b by Steffen [Steffen]
// 0 !HISTORY 2025-03-28 [Holly-Wood] Removed NOCLIP
// 0 !HISTORY 2025-04-27 [OrionP] Official Update 2025-04
// 
// 1 16 0 -0.25 0 20 0 0 0 0.25 0 0 0 -8 box5-12.dat
  [1,16,0,-0.25,0,20,0,0,0,0.25,0,0,0,-8, ldraw_lib__box5_12()],
// 1 16 0 -0.25 -4.5 0.415 0 0 0 1 0 0 0 0.415 s\196925s01.dat
  [1,16,0,-0.25,-4.5,0.415,0,0,0,1,0,0,0,0.415, ldraw_lib__s__196925s01()],
// 4 16 -20 -0.25 8 -16.6 -0.25 5.46 16.6 -0.25 5.46 20 -0.25 8
  [4,16,-20,-0.25,8,-16.6,-0.25,5.46,16.6,-0.25,5.46,20,-0.25,8],
// 4 16 -16.6 -0.25 5.46 -20 -0.25 8 -20 -0.25 -8 -16.6 -0.25 -7.82
  [4,16,-16.6,-0.25,5.46,-20,-0.25,8,-20,-0.25,-8,-16.6,-0.25,-7.82],
// 4 16 -16.6 -0.25 -7.82 -20 -0.25 -8 20 -0.25 -8 16.6 -0.25 -7.82
  [4,16,-16.6,-0.25,-7.82,-20,-0.25,-8,20,-0.25,-8,16.6,-0.25,-7.82],
// 4 16 20 -0.25 8 16.6 -0.25 5.46 16.6 -0.25 -7.82 20 -0.25 -8
  [4,16,20,-0.25,8,16.6,-0.25,5.46,16.6,-0.25,-7.82,20,-0.25,-8],
];
module ldraw_lib__196925b(step=0, col=false, unit=2/5, alt=false, line=0.2, solid=!$preview)
    makepoly(ldraw_lib__196925b(), step=step, col=col, unit=unit, alt=alt, line=line, solid=solid);
ldraw_lib__196925b(line=0.2);
// main file
use <../lib.scad>
use <196925b.scad>
use <3004.scad>
function ldraw_lib__3004d0o() = [
// 0 Brick  1 x  2 with White "7715" Sticker
// 0 Name: 3004d0o.dat
// 0 Author: Takeshi Takahashi [RainbowDolphin]
// 0 !LDRAW_ORG Shortcut UPDATE 2025-04
// 0 !LICENSE Licensed under CC BY 4.0 : see CAreadme.txt
// 
// 0 BFC CERTIFY CCW
  [0,"BFC","CERTIFY"],
  [0,"BFC","CCW"],
// 
// 0 !CATEGORY Sticker Shortcut
// 0 !KEYWORDS Bricklink 3004pb158, Set 7715, Train
// 
// 0 !HISTORY 2025-04-27 [OrionP] Official Update 2025-04
// 
// 1 16 0 0 0 1 0 0 0 1 0 0 0 1 3004.dat
  [1,16,0,0,0,1,0,0,0,1,0,0,0,1, ldraw_lib__3004()],
// 1 16 0 12 -10 1 0 0 0 0 -1 0 1 0 196925b.dat
  [1,16,0,12,-10,1,0,0,0,0,-1,0,1,0, ldraw_lib__196925b()],
];
module ldraw_lib__3004d0o(step=0, col=false, unit=2/5, alt=false, line=0.2, solid=!$preview)
    makepoly(ldraw_lib__3004d0o(), step=step, col=col, unit=unit, alt=alt, line=line, solid=solid);
ldraw_lib__3004d0o(line=0.2);
